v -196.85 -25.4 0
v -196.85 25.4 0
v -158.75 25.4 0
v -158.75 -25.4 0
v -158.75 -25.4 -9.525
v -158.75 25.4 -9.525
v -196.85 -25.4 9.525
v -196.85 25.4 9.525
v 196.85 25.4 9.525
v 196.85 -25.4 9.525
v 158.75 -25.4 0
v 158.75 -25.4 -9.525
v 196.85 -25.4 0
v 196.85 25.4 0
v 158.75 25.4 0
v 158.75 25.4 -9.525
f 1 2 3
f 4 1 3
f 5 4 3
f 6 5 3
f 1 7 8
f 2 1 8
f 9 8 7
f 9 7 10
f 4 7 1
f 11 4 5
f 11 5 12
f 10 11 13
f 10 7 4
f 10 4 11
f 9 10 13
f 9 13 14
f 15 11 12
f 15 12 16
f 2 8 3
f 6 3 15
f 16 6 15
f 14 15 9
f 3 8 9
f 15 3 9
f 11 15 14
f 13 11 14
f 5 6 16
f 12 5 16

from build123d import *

# Parameters (mm, degrees)
F0_W     = 393.7
F0_H     = 50.8
F1_DEPTH = 9.525
F2_W     = 38.1
F2_H     = 50.8
F3_DEPTH = 9.526


with BuildPart() as f1:
    # F0 (on Top) → F1 (new body, symmetric)
    with BuildSketch(Plane.XY):
        Rectangle(F0_W, F0_H)
    extrude(amount=F1_DEPTH, both=True)

    # F2 (on Top) → F3 (cut, through all)
    with BuildSketch(Plane.XY):
        with Locations((-177.8, 0)):
            Rectangle(F2_W, F2_H)
        with Locations((177.8, 0)):
            Rectangle(F2_W, F2_H)
    extrude(amount=-F3_DEPTH, mode=Mode.SUBTRACT)


solid = f1.part
